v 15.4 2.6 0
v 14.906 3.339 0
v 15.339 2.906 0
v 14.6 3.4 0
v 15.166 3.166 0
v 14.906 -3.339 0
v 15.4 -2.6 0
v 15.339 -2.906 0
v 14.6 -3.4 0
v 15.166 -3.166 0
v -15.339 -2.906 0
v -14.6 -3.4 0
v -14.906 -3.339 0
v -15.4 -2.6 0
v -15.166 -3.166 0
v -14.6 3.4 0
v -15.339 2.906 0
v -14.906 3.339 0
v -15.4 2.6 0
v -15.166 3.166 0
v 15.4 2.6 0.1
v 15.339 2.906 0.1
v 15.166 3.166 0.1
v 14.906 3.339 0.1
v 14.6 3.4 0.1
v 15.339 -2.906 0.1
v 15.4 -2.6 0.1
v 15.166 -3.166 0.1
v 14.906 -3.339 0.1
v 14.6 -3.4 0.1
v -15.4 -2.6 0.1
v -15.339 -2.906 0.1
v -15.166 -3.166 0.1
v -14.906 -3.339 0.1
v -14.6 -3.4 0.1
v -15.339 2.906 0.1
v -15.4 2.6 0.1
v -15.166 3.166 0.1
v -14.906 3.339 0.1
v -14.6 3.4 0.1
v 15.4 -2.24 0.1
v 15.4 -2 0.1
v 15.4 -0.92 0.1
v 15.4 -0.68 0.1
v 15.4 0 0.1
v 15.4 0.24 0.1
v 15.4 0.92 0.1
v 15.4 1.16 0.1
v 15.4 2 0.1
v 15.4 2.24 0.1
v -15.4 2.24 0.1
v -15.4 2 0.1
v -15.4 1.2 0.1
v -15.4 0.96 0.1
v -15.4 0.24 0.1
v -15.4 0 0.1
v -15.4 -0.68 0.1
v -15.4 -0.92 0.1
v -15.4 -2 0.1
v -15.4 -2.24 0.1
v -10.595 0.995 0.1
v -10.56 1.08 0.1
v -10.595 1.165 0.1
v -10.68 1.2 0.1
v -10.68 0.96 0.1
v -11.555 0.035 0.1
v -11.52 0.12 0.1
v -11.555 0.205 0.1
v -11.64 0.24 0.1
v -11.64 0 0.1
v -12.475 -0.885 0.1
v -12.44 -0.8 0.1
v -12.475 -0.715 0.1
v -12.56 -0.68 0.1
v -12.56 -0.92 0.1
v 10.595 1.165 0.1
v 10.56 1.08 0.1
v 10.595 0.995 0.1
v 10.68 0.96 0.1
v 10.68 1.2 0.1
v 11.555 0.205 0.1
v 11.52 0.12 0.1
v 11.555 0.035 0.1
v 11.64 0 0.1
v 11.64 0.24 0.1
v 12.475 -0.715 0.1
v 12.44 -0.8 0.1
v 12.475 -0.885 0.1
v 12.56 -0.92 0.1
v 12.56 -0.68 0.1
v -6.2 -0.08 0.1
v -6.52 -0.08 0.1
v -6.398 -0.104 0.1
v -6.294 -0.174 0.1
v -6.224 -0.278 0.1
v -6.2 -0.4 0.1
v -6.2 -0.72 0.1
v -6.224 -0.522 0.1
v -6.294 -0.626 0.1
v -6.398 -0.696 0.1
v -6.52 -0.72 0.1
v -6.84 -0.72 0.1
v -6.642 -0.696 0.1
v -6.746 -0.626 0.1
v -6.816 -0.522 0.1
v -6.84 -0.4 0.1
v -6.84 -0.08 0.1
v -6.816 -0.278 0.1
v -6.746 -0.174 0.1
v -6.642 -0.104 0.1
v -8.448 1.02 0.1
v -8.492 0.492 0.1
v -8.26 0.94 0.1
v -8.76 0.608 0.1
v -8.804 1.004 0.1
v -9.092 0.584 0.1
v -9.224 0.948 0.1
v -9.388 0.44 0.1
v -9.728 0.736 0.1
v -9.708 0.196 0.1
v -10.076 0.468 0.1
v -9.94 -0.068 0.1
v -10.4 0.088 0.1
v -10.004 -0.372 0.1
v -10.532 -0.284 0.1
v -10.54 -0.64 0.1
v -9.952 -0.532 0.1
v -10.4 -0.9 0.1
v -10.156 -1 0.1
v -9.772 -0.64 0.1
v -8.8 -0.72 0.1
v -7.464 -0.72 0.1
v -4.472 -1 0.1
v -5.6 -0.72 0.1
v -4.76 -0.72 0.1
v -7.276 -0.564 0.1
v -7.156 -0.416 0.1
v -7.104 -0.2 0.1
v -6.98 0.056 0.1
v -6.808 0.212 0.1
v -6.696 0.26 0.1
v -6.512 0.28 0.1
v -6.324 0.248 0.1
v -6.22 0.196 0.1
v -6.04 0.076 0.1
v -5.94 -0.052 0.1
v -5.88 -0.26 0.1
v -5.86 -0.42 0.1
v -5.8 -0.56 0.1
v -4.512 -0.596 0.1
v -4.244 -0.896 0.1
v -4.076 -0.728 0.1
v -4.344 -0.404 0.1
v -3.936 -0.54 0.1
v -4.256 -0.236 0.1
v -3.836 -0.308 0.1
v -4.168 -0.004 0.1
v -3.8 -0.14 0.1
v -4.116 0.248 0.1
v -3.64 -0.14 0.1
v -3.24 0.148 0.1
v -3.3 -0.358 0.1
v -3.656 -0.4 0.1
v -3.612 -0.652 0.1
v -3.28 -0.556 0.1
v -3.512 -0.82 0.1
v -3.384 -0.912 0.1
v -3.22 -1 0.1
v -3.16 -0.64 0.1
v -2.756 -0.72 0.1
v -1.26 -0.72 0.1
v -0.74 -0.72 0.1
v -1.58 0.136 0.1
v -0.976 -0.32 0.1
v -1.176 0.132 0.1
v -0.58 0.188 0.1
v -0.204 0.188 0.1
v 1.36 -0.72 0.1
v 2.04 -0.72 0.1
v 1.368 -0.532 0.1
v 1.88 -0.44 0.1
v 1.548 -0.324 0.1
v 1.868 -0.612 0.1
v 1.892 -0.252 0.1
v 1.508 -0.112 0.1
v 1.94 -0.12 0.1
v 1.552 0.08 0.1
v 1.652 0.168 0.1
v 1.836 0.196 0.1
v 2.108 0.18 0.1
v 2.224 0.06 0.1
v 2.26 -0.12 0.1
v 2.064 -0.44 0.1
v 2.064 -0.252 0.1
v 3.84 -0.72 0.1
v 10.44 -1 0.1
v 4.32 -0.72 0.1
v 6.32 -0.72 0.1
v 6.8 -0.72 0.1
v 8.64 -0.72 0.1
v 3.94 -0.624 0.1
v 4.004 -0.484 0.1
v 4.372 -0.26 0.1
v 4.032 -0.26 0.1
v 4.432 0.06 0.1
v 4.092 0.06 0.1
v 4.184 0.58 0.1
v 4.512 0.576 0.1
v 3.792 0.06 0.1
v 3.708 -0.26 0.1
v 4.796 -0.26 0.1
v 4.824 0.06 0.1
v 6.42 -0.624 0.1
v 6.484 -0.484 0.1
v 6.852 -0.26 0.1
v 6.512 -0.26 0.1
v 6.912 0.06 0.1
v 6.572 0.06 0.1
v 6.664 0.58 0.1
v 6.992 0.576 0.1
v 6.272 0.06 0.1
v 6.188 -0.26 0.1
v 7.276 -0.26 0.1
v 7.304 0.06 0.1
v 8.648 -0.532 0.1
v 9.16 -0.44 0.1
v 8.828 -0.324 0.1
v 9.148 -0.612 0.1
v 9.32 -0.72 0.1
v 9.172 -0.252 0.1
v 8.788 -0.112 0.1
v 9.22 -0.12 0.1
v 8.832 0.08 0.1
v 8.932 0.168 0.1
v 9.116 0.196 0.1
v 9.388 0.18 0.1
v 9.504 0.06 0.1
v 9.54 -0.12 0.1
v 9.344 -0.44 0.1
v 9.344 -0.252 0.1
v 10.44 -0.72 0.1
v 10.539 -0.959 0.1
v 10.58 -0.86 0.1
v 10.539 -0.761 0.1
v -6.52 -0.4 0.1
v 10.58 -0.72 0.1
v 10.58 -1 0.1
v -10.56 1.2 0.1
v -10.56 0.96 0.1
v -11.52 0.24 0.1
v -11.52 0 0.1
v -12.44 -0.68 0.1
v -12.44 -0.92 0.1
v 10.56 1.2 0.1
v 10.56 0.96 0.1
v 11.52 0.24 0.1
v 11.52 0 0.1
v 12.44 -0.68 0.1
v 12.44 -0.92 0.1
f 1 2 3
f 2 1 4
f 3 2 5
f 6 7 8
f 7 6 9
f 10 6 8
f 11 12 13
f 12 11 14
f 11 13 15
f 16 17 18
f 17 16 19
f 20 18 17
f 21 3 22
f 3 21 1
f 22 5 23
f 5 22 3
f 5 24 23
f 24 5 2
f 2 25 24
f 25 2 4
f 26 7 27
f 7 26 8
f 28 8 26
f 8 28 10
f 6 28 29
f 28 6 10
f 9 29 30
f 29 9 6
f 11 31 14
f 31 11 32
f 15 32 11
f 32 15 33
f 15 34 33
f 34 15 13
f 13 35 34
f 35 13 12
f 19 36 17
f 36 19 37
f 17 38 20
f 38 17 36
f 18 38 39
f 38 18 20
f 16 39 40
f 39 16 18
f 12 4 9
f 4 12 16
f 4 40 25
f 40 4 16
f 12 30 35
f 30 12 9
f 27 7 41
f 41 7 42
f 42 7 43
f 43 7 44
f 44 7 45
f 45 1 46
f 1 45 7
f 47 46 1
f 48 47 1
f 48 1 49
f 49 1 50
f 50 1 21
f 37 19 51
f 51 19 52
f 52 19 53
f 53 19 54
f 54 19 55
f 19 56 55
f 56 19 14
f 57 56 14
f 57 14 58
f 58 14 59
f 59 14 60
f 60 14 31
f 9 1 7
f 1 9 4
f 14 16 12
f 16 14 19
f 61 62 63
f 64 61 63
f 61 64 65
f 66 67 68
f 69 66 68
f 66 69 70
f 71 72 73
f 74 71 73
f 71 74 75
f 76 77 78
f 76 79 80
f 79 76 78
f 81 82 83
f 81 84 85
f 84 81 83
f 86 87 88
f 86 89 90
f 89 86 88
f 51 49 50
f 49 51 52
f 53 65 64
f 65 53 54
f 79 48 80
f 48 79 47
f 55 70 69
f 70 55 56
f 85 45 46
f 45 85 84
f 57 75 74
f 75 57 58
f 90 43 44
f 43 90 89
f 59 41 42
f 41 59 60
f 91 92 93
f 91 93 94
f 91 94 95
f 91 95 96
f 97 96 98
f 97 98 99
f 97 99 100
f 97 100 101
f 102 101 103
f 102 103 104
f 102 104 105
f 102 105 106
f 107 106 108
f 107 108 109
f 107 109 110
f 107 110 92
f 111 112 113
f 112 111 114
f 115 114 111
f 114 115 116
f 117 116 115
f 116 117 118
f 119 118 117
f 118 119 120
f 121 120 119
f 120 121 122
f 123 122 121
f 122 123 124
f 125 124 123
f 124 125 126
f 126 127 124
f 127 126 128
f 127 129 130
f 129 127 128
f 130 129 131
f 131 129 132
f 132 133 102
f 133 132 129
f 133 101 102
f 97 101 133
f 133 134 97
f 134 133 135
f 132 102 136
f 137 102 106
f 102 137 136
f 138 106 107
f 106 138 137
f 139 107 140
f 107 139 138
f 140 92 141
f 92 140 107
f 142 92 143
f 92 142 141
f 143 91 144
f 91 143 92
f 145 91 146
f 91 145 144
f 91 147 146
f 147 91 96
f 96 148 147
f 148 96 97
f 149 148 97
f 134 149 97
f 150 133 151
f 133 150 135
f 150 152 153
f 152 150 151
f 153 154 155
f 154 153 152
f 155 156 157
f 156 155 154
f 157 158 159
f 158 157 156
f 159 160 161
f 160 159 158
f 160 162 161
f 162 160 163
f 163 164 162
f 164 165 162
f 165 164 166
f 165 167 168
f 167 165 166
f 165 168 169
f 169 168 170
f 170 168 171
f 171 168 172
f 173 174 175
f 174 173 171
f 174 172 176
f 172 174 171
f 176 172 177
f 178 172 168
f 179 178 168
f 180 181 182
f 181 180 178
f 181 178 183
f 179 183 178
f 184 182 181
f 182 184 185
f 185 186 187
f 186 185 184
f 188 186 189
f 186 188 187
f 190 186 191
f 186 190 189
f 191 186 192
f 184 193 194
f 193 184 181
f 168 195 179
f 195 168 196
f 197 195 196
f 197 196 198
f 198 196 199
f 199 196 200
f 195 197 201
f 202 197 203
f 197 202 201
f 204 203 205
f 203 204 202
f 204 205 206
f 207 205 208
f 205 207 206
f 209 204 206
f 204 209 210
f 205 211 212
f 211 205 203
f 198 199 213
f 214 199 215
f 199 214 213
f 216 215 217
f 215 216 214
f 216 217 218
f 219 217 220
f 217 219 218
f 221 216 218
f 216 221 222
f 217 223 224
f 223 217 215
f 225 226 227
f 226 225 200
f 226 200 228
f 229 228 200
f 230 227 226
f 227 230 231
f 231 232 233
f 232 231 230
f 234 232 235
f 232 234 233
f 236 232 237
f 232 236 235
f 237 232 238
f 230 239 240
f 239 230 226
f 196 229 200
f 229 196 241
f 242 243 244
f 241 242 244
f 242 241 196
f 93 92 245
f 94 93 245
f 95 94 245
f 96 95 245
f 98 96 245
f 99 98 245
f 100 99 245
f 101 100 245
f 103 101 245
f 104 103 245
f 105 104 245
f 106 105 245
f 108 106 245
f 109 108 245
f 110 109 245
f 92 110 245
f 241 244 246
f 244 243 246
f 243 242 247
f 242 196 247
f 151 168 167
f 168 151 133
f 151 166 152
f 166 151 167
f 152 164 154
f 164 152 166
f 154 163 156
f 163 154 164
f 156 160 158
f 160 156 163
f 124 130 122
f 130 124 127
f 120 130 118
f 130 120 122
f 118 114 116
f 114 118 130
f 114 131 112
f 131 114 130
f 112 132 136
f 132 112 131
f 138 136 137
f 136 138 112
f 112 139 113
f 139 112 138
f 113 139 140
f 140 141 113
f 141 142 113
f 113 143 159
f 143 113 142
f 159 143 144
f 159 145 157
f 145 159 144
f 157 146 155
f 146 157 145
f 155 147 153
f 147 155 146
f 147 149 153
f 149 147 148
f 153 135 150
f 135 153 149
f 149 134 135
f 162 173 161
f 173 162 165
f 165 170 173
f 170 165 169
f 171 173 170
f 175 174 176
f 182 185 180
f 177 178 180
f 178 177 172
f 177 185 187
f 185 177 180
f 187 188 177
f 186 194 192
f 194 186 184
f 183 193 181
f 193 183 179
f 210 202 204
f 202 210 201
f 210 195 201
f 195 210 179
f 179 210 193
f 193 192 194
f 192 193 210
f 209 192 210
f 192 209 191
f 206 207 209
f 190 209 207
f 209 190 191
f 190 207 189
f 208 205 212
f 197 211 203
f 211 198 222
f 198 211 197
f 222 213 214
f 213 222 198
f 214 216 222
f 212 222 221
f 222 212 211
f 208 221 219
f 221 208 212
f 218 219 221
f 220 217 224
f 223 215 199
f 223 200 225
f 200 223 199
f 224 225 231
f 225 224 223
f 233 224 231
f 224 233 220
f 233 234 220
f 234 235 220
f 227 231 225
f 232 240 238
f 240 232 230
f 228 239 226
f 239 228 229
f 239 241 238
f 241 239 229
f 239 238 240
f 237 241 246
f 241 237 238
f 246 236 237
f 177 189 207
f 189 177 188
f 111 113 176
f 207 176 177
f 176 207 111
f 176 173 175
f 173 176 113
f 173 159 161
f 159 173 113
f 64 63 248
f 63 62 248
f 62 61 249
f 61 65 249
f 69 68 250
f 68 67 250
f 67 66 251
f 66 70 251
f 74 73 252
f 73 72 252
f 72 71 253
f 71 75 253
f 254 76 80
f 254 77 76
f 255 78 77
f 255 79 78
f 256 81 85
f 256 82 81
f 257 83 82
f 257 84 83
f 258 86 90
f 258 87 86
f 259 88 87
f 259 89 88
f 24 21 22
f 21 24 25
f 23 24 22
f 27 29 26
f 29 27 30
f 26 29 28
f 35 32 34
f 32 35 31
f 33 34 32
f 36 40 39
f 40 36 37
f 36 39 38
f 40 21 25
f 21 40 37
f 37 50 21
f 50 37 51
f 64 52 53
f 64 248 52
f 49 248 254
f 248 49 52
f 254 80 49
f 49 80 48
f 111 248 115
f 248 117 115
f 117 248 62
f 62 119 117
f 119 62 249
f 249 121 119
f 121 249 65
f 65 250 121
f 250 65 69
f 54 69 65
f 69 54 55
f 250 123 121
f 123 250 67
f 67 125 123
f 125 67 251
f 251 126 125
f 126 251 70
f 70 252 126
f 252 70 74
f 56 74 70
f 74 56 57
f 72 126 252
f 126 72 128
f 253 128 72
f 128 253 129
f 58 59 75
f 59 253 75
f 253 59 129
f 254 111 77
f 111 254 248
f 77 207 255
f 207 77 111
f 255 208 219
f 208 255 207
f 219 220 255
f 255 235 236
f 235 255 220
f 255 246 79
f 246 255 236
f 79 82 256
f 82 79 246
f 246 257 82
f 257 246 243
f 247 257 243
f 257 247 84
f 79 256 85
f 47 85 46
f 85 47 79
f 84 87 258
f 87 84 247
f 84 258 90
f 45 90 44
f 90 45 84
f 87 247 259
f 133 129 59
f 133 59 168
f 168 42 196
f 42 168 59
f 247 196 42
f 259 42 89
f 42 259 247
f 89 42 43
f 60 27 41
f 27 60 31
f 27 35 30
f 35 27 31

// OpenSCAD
// file: ../p/4-4disc.scad
use <../lib.scad>
function ldraw_lib__4_4disc() = [
// 0 Disc 1.0
// 0 Name: 4-4disc.dat
// 0 Author: James Jessiman
// 0 !LDRAW_ORG Primitive UPDATE 2002-02
// 0 !LICENSE Licensed under CC BY 4.0 : see CAreadme.txt
// 
// 0 BFC CERTIFY CCW
  [0,"BFC","CERTIFY"],
  [0,"BFC","CCW"],
// 
// 0 !HISTORY 1998-12-15 [PTadmin] Official Update 1998-10
// 0 !HISTORY 2002-03-23 [sbliss] Added BFC statement
// 0 !HISTORY 2002-04-25 [PTadmin] Official Update 2002-02
// 0 !HISTORY 2007-06-24 [PTadmin] Header formatted for Contributor Agreement
// 0 !HISTORY 2008-07-01 [PTadmin] Official Update 2008-01
// 
// 
// 3 16 0 0 0 1 0 0 0.9239 0 0.3827
  [3,16,0,0,0,1,0,0,0.9239,0,0.3827],
// 3 16 0 0 0 0.9239 0 0.3827 0.7071 0 0.7071
  [3,16,0,0,0,0.9239,0,0.3827,0.7071,0,0.7071],
// 3 16 0 0 0 0.7071 0 0.7071 0.3827 0 0.9239
  [3,16,0,0,0,0.7071,0,0.7071,0.3827,0,0.9239],
// 3 16 0 0 0 0.3827 0 0.9239 0 0 1
  [3,16,0,0,0,0.3827,0,0.9239,0,0,1],
// 3 16 0 0 0 0 0 1 -0.3827 0 0.9239
  [3,16,0,0,0,0,0,1,-0.3827,0,0.9239],
// 3 16 0 0 0 -0.3827 0 0.9239 -0.7071 0 0.7071
  [3,16,0,0,0,-0.3827,0,0.9239,-0.7071,0,0.7071],
// 3 16 0 0 0 -0.7071 0 0.7071 -0.9239 0 0.3827
  [3,16,0,0,0,-0.7071,0,0.7071,-0.9239,0,0.3827],
// 3 16 0 0 0 -0.9239 0 0.3827 -1 0 -0
  [3,16,0,0,0,-0.9239,0,0.3827,-1,0,-0],
// 3 16 0 0 0 -1 0 -0 -0.9239 0 -0.3827
  [3,16,0,0,0,-1,0,-0,-0.9239,0,-0.3827],
// 3 16 0 0 0 -0.9239 0 -0.3827 -0.7071 0 -0.7071
  [3,16,0,0,0,-0.9239,0,-0.3827,-0.7071,0,-0.7071],
// 3 16 0 0 0 -0.7071 0 -0.7071 -0.3827 0 -0.9239
  [3,16,0,0,0,-0.7071,0,-0.7071,-0.3827,0,-0.9239],
// 3 16 0 0 0 -0.3827 0 -0.9239 0 0 -1
  [3,16,0,0,0,-0.3827,0,-0.9239,0,0,-1],
// 3 16 0 0 0 0 0 -1 0.3827 0 -0.9239
  [3,16,0,0,0,0,0,-1,0.3827,0,-0.9239],
// 3 16 0 0 0 0.3827 0 -0.9239 0.7071 0 -0.7071
  [3,16,0,0,0,0.3827,0,-0.9239,0.7071,0,-0.7071],
// 3 16 0 0 0 0.7071 0 -0.7071 0.9239 0 -0.3827
  [3,16,0,0,0,0.7071,0,-0.7071,0.9239,0,-0.3827],
// 3 16 0 0 0 0.9239 0 -0.3827 1 0 0
  [3,16,0,0,0,0.9239,0,-0.3827,1,0,0],
// 0
];
module ldraw_lib__4_4disc(step=0, col=false, unit=2/5, alt=false, line=0.2, solid=!$preview)
    makepoly(ldraw_lib__4_4disc(), step=step, col=col, unit=unit, alt=alt, line=line, solid=solid);
ldraw_lib__4_4disc(line=0.2);
// file: ../p/4-4ndis.scad
use <../lib.scad>
function ldraw_lib__4_4ndis() = [
// 0 Disc Negative 1.0
// 0 Name: 4-4ndis.dat
// 0 Author: James Jessiman
// 0 !LDRAW_ORG Primitive UPDATE 2012-01
// 0 !LICENSE Licensed under CC BY 4.0 : see CAreadme.txt
// 
// 0 BFC CERTIFY CCW
  [0,"BFC","CERTIFY"],
  [0,"BFC","CCW"],
// 
// 0 !HISTORY 2002-03-23 [sbliss] Added BFC statement; compacted code
// 0 !HISTORY 2002-04-25 [PTadmin] Official Update 2002-02
// 0 !HISTORY 2007-06-24 [PTadmin] Header formatted for Contributor Agreement
// 0 !HISTORY 2008-07-01 [PTadmin] Official Update 2008-01
// 0 !HISTORY 2012-02-16 [Philo] Changed to CCW
// 0 !HISTORY 2012-03-30 [PTadmin] Official Update 2012-01
// 
// 
// 3 16 0.9239 0 0.3827 1 0 0 1 0 1
  [3,16,0.9239,0,0.3827,1,0,0,1,0,1],
// 3 16 0.7071 0 0.7071 0.9239 0 0.3827 1 0 1
  [3,16,0.7071,0,0.7071,0.9239,0,0.3827,1,0,1],
// 3 16 0.3827 0 0.9239 0.7071 0 0.7071 1 0 1
  [3,16,0.3827,0,0.9239,0.7071,0,0.7071,1,0,1],
// 3 16 0 0 1 0.3827 0 0.9239 1 0 1
  [3,16,0,0,1,0.3827,0,0.9239,1,0,1],
// 3 16 -0.3827 0 0.9239 0 0 1 -1 0 1
  [3,16,-0.3827,0,0.9239,0,0,1,-1,0,1],
// 3 16 -0.7071 0 0.7071 -0.3827 0 0.9239 -1 0 1
  [3,16,-0.7071,0,0.7071,-0.3827,0,0.9239,-1,0,1],
// 3 16 -0.9239 0 0.3827 -0.7071 0 0.7071 -1 0 1
  [3,16,-0.9239,0,0.3827,-0.7071,0,0.7071,-1,0,1],
// 3 16 -1 0 0 -0.9239 0 0.3827 -1 0 1
  [3,16,-1,0,0,-0.9239,0,0.3827,-1,0,1],
// 3 16 -0.9239 0 -0.3827 -1 0 0 -1 0 -1
  [3,16,-0.9239,0,-0.3827,-1,0,0,-1,0,-1],
// 3 16 -0.7071 0 -0.7071 -0.9239 0 -0.3827 -1 0 -1
  [3,16,-0.7071,0,-0.7071,-0.9239,0,-0.3827,-1,0,-1],
// 3 16 -0.3827 0 -0.9239 -0.7071 0 -0.7071 -1 0 -1
  [3,16,-0.3827,0,-0.9239,-0.7071,0,-0.7071,-1,0,-1],
// 3 16 0 0 -1 -0.3827 0 -0.9239 -1 0 -1
  [3,16,0,0,-1,-0.3827,0,-0.9239,-1,0,-1],
// 3 16 0.3827 0 -0.9239 0 0 -1 1 0 -1
  [3,16,0.3827,0,-0.9239,0,0,-1,1,0,-1],
// 3 16 0.7071 0 -0.7071 0.3827 0 -0.9239 1 0 -1
  [3,16,0.7071,0,-0.7071,0.3827,0,-0.9239,1,0,-1],
// 3 16 0.9239 0 -0.3827 0.7071 0 -0.7071 1 0 -1
  [3,16,0.9239,0,-0.3827,0.7071,0,-0.7071,1,0,-1],
// 3 16 1 0 0 0.9239 0 -0.3827 1 0 -1
  [3,16,1,0,0,0.9239,0,-0.3827,1,0,-1],
];
module ldraw_lib__4_4ndis(step=0, col=false, unit=2/5, alt=false, line=0.2, solid=!$preview)
    makepoly(ldraw_lib__4_4ndis(), step=step, col=col, unit=unit, alt=alt, line=line, solid=solid);
ldraw_lib__4_4ndis(line=0.2);
// file: ../p/box3u12.scad
use <../lib.scad>
function ldraw_lib__box3u12() = [
// 0 Box with 3 Parallel Faces without Any Edges
// 0 Name: box3u12.dat
// 0 Author: J.C. Tchang [tchang]
// 0 !LDRAW_ORG Primitive UPDATE 2014-02
// 0 !LICENSE Licensed under CC BY 4.0 : see CAreadme.txt
// 
// 0 BFC CERTIFY CCW
  [0,"BFC","CERTIFY"],
  [0,"BFC","CCW"],
// 
// 0 !HISTORY 2014-12-23 [PTadmin] Official Update 2014-02
// 
// 
// 4 16 -1 1 1 1 1 1 1 1 -1 -1 1 -1
  [4,16,-1,1,1,1,1,1,1,1,-1,-1,1,-1],
// 4 16 -1 1 1 -1 0 1 1 0 1 1 1 1
  [4,16,-1,1,1,-1,0,1,1,0,1,1,1,1],
// 4 16 1 1 -1 1 0 -1 -1 0 -1 -1 1 -1
  [4,16,1,1,-1,1,0,-1,-1,0,-1,-1,1,-1],
];
module ldraw_lib__box3u12(step=0, col=false, unit=2/5, alt=false, line=0.2, solid=!$preview)
    makepoly(ldraw_lib__box3u12(), step=step, col=col, unit=unit, alt=alt, line=line, solid=solid);
ldraw_lib__box3u12(line=0.2);
// file: ../p/8/2-4ndis.scad
use <../../lib.scad>
function ldraw_lib__8__2_4ndis() = [
// 0 Lo-Res Disc Negative 0.5
// 0 Name: 8\2-4ndis.dat
// 0 Author: Magnus Forsberg [MagFors]
// 0 !LDRAW_ORG 8_Primitive UPDATE 2018-02
// 0 !LICENSE Licensed under CC BY 4.0 : see CAreadme.txt
// 
// 0 BFC CERTIFY CCW
  [0,"BFC","CERTIFY"],
  [0,"BFC","CCW"],
// 
// 0 !HISTORY 2018-12-08 [PTadmin] Official Update 2018-02
// 
// 
// 3 16 1 0 1 0.7071 0 0.7071 1 0 0
  [3,16,1,0,1,0.7071,0,0.7071,1,0,0],
// 3 16 1 0 1 0 0 1 0.7071 0 0.7071
  [3,16,1,0,1,0,0,1,0.7071,0,0.7071],
// 3 16 -1 0 1 -0.7071 0 0.7071 0 0 1
  [3,16,-1,0,1,-0.7071,0,0.7071,0,0,1],
// 3 16 -1 0 1 -1 0 0 -0.7071 0 0.7071
  [3,16,-1,0,1,-1,0,0,-0.7071,0,0.7071],
// 0 // Build by Primitive Generator 2
];
module ldraw_lib__8__2_4ndis(step=0, col=false, unit=2/5, alt=false, line=0.2, solid=!$preview)
    makepoly(ldraw_lib__8__2_4ndis(), step=step, col=col, unit=unit, alt=alt, line=line, solid=solid);
ldraw_lib__8__2_4ndis(line=0.2);
// file: ../p/8/2-4chrd.scad
use <../../lib.scad>
function ldraw_lib__8__2_4chrd() = [
// 0 Chord 0.5
// 0 Name: 8\2-4chrd.dat
// 0 Author: Magnus Forsberg [MagFors]
// 0 !LDRAW_ORG 8_Primitive UPDATE 2017-01
// 0 !LICENSE Licensed under CC BY 4.0 : see CAreadme.txt
// 
// 0 BFC CERTIFY CCW
  [0,"BFC","CERTIFY"],
  [0,"BFC","CCW"],
// 
// 0 !HISTORY 2017-12-30 [PTadmin] Official Update 2017-01
// 
// 
// 3 16 .7071 0 .7071 0 0 1 -.7071 0 .7071
  [3,16,.7071,0,.7071,0,0,1,-.7071,0,.7071],
// 4 16 .7071 0 .7071 -.7071 0 .7071 -1 0 0 1 0 0
  [4,16,.7071,0,.7071,-.7071,0,.7071,-1,0,0,1,0,0],
];
module ldraw_lib__8__2_4chrd(step=0, col=false, unit=2/5, alt=false, line=0.2, solid=!$preview)
    makepoly(ldraw_lib__8__2_4chrd(), step=step, col=col, unit=unit, alt=alt, line=line, solid=solid);
ldraw_lib__8__2_4chrd(line=0.2);
// file: ../p/1-4cyli.scad
use <../lib.scad>
function ldraw_lib__1_4cyli() = [
// 0 Cylinder 0.25
// 0 Name: 1-4cyli.dat
// 0 Author: James Jessiman
// 0 !LDRAW_ORG Primitive UPDATE 2012-01
// 0 !LICENSE Licensed under CC BY 4.0 : see CAreadme.txt
// 
// 0 BFC CERTIFY CCW
  [0,"BFC","CERTIFY"],
  [0,"BFC","CCW"],
// 
// 0 !HISTORY 2002-03-23 [sbliss] Added BFC statement.
// 0 !HISTORY 2002-04-25 [PTadmin] Official Update 2002-02
// 0 !HISTORY 2007-06-22 [PTadmin] Header formatted for Contributor Agreement
// 0 !HISTORY 2008-07-01 [PTadmin] Official Update 2008-01
// 0 !HISTORY 2012-02-16 [Philo] Changed to CCW
// 0 !HISTORY 2012-03-30 [PTadmin] Official Update 2012-01
// 
// 
// 4 16 1 1 0 0.9239 1 0.3827 0.9239 0 0.3827 1 0 0
  [4,16,1,1,0,0.9239,1,0.3827,0.9239,0,0.3827,1,0,0],
// 5 24 1 0 0 1 1 0 0.9239 0 0.3827 1 0 -1
  [5,24,1,0,0,1,1,0,0.9239,0,0.3827,1,0,-1],
// 4 16 0.9239 1 0.3827 0.7071 1 0.7071 0.7071 0 0.7071 0.9239 0 0.3827
  [4,16,0.9239,1,0.3827,0.7071,1,0.7071,0.7071,0,0.7071,0.9239,0,0.3827],
// 5 24 0.9239 0 0.3827 0.9239 1 0.3827 0.7071 0 0.7071 1 0 0
  [5,24,0.9239,0,0.3827,0.9239,1,0.3827,0.7071,0,0.7071,1,0,0],
// 4 16 0.7071 1 0.7071 0.3827 1 0.9239 0.3827 0 0.9239 0.7071 0 0.7071
  [4,16,0.7071,1,0.7071,0.3827,1,0.9239,0.3827,0,0.9239,0.7071,0,0.7071],
// 5 24 0.7071 0 0.7071 0.7071 1 0.7071 0.3827 0 0.9239 0.9239 0 0.3827
  [5,24,0.7071,0,0.7071,0.7071,1,0.7071,0.3827,0,0.9239,0.9239,0,0.3827],
// 4 16 0.3827 1 0.9239 0 1 1 0 0 1 0.3827 0 0.9239
  [4,16,0.3827,1,0.9239,0,1,1,0,0,1,0.3827,0,0.9239],
// 5 24 0.3827 0 0.9239 0.3827 1 0.9239 0 0 1 0.7071 0 0.7071
  [5,24,0.3827,0,0.9239,0.3827,1,0.9239,0,0,1,0.7071,0,0.7071],
// 5 24 0 0 1 0 1 1 0.3827 0 0.9239 -1 0 1
  [5,24,0,0,1,0,1,1,0.3827,0,0.9239,-1,0,1],
];
module ldraw_lib__1_4cyli(step=0, col=false, unit=2/5, alt=false, line=0.2, solid=!$preview)
    makepoly(ldraw_lib__1_4cyli(), step=step, col=col, unit=unit, alt=alt, line=line, solid=solid);
ldraw_lib__1_4cyli(line=0.2);
// file: ../p/1-4chrd.scad
use <../lib.scad>
function ldraw_lib__1_4chrd() = [
// 0 Chord 0.25
// 0 Name: 1-4chrd.dat
// 0 Author: Max Martin Richter [MMR1988]
// 0 !LDRAW_ORG Primitive UPDATE 2023-05
// 0 !LICENSE Licensed under CC BY 4.0 : see CAreadme.txt
// 
// 0 BFC CERTIFY CCW
  [0,"BFC","CERTIFY"],
  [0,"BFC","CCW"],
// 
// 0 !HISTORY 2004-04-22 [PTadmin] Official Update 2004-02
// 0 !HISTORY 2007-10-09 [PTadmin] Header formatted for Contributor Agreement
// 0 !HISTORY 2008-07-01 [PTadmin] Official Update 2008-01
// 0 !HISTORY 2012-08-02 [MMR1988] Re-creation with PrimGen2 and Rectifier
// 0 !HISTORY 2012-08-09 [PTadmin] Official Update 2012-02
// 0 !HISTORY 2023-10-27 [OrionP] Change author to MMR1988 from hafhead
// 0 !HISTORY 2023-10-31 [OrionP] Official Update 2023-05
// 
// 4 16 0.9239 0 0.3827 0.3827 0 0.9239 0 0 1 1 0 0
  [4,16,0.9239,0,0.3827,0.3827,0,0.9239,0,0,1,1,0,0],
// 3 16 0.7071 0 0.7071 0.3827 0 0.9239 0.9239 0 0.3827
  [3,16,0.7071,0,0.7071,0.3827,0,0.9239,0.9239,0,0.3827],
];
module ldraw_lib__1_4chrd(step=0, col=false, unit=2/5, alt=false, line=0.2, solid=!$preview)
    makepoly(ldraw_lib__1_4chrd(), step=step, col=col, unit=unit, alt=alt, line=line, solid=solid);
ldraw_lib__1_4chrd(line=0.2);
// main file
use <../lib.scad>
use <../p/1-4chrd.scad>
use <../p/1-4cyli.scad>
use <../p/8/2-4chrd.scad>
use <../p/8/2-4ndis.scad>
use <../p/box3u12.scad>
use <s/6451314es01.scad>
use <s/6451314es02.scad>
function ldraw_lib__6451314e() = [
// 0 Sticker  0.8 x  3.9 with Dark Bluish Grey "Corvette" on Light Bluish Grey Background
// 0 Name: 6451314e.dat
// 0 Author: Vincent Messenet [Cheenzo]
// 0 !LDRAW_ORG Part UPDATE 2024-07
// 0 !LICENSE Licensed under CC BY 4.0 : see CAreadme.txt
// 
// 0 BFC CERTIFY CCW
  [0,"BFC","CERTIFY"],
  [0,"BFC","CCW"],
// 
// 0 !KEYWORDS Bricklink 10321stk01, Brickowl 1314396, Chevrolet, Corvette, Icons
// 0 !KEYWORDS Rebrickable 10104784, Set 10321
// 
// 0 !HISTORY 2024-08-26 [OrionP] Official Update 2024-07
// 
// 1 16 36.5 0 6.5 2 0 0 0 -1 0 0 0 2 1-4chrd.dat
  [1,16,36.5,0,6.5,2,0,0,0,-1,0,0,0,2, ldraw_lib__1_4chrd()],
// 1 16 36.5 0 -6.5 2 0 0 0 -1 0 0 0 -2 1-4chrd.dat
  [1,16,36.5,0,-6.5,2,0,0,0,-1,0,0,0,-2, ldraw_lib__1_4chrd()],
// 1 16 -36.5 0 -6.5 -2 0 0 0 -1 0 0 0 -2 1-4chrd.dat
  [1,16,-36.5,0,-6.5,-2,0,0,0,-1,0,0,0,-2, ldraw_lib__1_4chrd()],
// 1 16 -36.5 0 6.5 -2 0 0 0 -1 0 0 0 2 1-4chrd.dat
  [1,16,-36.5,0,6.5,-2,0,0,0,-1,0,0,0,2, ldraw_lib__1_4chrd()],
// 1 16 36.5 0 6.5 2 0 0 0 -.25 0 0 0 2 1-4cyli.dat
  [1,16,36.5,0,6.5,2,0,0,0,-.25,0,0,0,2, ldraw_lib__1_4cyli()],
// 1 16 36.5 0 -6.5 2 0 0 0 -.25 0 0 0 -2 1-4cyli.dat
  [1,16,36.5,0,-6.5,2,0,0,0,-.25,0,0,0,-2, ldraw_lib__1_4cyli()],
// 1 16 -36.5 0 -6.5 -2 0 0 0 -.25 0 0 0 -2 1-4cyli.dat
  [1,16,-36.5,0,-6.5,-2,0,0,0,-.25,0,0,0,-2, ldraw_lib__1_4cyli()],
// 1 16 -36.5 0 6.5 -2 0 0 0 -.25 0 0 0 2 1-4cyli.dat
  [1,16,-36.5,0,6.5,-2,0,0,0,-.25,0,0,0,2, ldraw_lib__1_4cyli()],
// 1 16 0 -.25 0 36.5 0 0 0 .25 0 0 0 8.5 box3u12.dat
  [1,16,0,-.25,0,36.5,0,0,0,.25,0,0,0,8.5, ldraw_lib__box3u12()],
// 3 16 38.5 -.25 -6.5 38.5 0 -6.5 38.5 -.25 -5.6
  [3,16,38.5,-.25,-6.5,38.5,0,-6.5,38.5,-.25,-5.6],
// 3 16 38.5 -.25 -5.6 38.5 0 -6.5 38.5 -.25 -5
  [3,16,38.5,-.25,-5.6,38.5,0,-6.5,38.5,-.25,-5],
// 3 16 38.5 -.25 -5 38.5 0 -6.5 38.5 -.25 -2.3
  [3,16,38.5,-.25,-5,38.5,0,-6.5,38.5,-.25,-2.3],
// 3 16 38.5 -.25 -2.3 38.5 0 -6.5 38.5 -.25 -1.7
  [3,16,38.5,-.25,-2.3,38.5,0,-6.5,38.5,-.25,-1.7],
// 3 16 38.5 -.25 -1.7 38.5 0 -6.5 38.5 -.25 0
  [3,16,38.5,-.25,-1.7,38.5,0,-6.5,38.5,-.25,0],
// 4 16 38.5 -.25 .6 38.5 -.25 0 38.5 0 -6.5 38.5 0 6.5
  [4,16,38.5,-.25,.6,38.5,-.25,0,38.5,0,-6.5,38.5,0,6.5],
// 3 16 38.5 -.25 2.3 38.5 -.25 .6 38.5 0 6.5
  [3,16,38.5,-.25,2.3,38.5,-.25,.6,38.5,0,6.5],
// 3 16 38.5 -.25 2.9 38.5 -.25 2.3 38.5 0 6.5
  [3,16,38.5,-.25,2.9,38.5,-.25,2.3,38.5,0,6.5],
// 3 16 38.5 -.25 2.9 38.5 0 6.5 38.5 -.25 5
  [3,16,38.5,-.25,2.9,38.5,0,6.5,38.5,-.25,5],
// 3 16 38.5 -.25 5 38.5 0 6.5 38.5 -.25 5.6
  [3,16,38.5,-.25,5,38.5,0,6.5,38.5,-.25,5.6],
// 3 16 38.5 -.25 5.6 38.5 0 6.5 38.5 -.25 6.5
  [3,16,38.5,-.25,5.6,38.5,0,6.5,38.5,-.25,6.5],
// 3 16 -38.5 -.25 6.5 -38.5 0 6.5 -38.5 -.25 5.6
  [3,16,-38.5,-.25,6.5,-38.5,0,6.5,-38.5,-.25,5.6],
// 3 16 -38.5 -.25 5.6 -38.5 0 6.5 -38.5 -.25 5
  [3,16,-38.5,-.25,5.6,-38.5,0,6.5,-38.5,-.25,5],
// 3 16 -38.5 -.25 5 -38.5 0 6.5 -38.5 -.25 3
  [3,16,-38.5,-.25,5,-38.5,0,6.5,-38.5,-.25,3],
// 3 16 -38.5 -.25 3 -38.5 0 6.5 -38.5 -.25 2.4
  [3,16,-38.5,-.25,3,-38.5,0,6.5,-38.5,-.25,2.4],
// 3 16 -38.5 -.25 2.4 -38.5 0 6.5 -38.5 -.25 .6
  [3,16,-38.5,-.25,2.4,-38.5,0,6.5,-38.5,-.25,.6],
// 4 16 -38.5 -.25 0 -38.5 -.25 .6 -38.5 0 6.5 -38.5 0 -6.5
  [4,16,-38.5,-.25,0,-38.5,-.25,.6,-38.5,0,6.5,-38.5,0,-6.5],
// 3 16 -38.5 -.25 -1.7 -38.5 -.25 0 -38.5 0 -6.5
  [3,16,-38.5,-.25,-1.7,-38.5,-.25,0,-38.5,0,-6.5],
// 3 16 -38.5 -.25 -1.7 -38.5 0 -6.5 -38.5 -.25 -2.3
  [3,16,-38.5,-.25,-1.7,-38.5,0,-6.5,-38.5,-.25,-2.3],
// 3 16 -38.5 -.25 -2.3 -38.5 0 -6.5 -38.5 -.25 -5
  [3,16,-38.5,-.25,-2.3,-38.5,0,-6.5,-38.5,-.25,-5],
// 3 16 -38.5 -.25 -5 -38.5 0 -6.5 -38.5 -.25 -5.6
  [3,16,-38.5,-.25,-5,-38.5,0,-6.5,-38.5,-.25,-5.6],
// 3 16 -38.5 -.25 -5.6 -38.5 0 -6.5 -38.5 -.25 -6.5
  [3,16,-38.5,-.25,-5.6,-38.5,0,-6.5,-38.5,-.25,-6.5],
// 4 16 36.5 0 8.5 38.5 0 6.5 38.5 0 -6.5 36.5 0 -8.5
  [4,16,36.5,0,8.5,38.5,0,6.5,38.5,0,-6.5,36.5,0,-8.5],
// 4 16 -36.5 0 -8.5 -38.5 0 -6.5 -38.5 0 6.5 -36.5 0 8.5
  [4,16,-36.5,0,-8.5,-38.5,0,-6.5,-38.5,0,6.5,-36.5,0,8.5],
// 1 72 -26.7 -.25 2.7 0 0 .3 0 1 0 .3 0 0 8\2-4chrd.dat
  [1,72,-26.7,-.25,2.7,0,0,.3,0,1,0,.3,0,0, ldraw_lib__8__2_4chrd()],
// 1 72 -29.1 -.25 .3 0 0 .3 0 1 0 .3 0 0 8\2-4chrd.dat
  [1,72,-29.1,-.25,.3,0,0,.3,0,1,0,.3,0,0, ldraw_lib__8__2_4chrd()],
// 1 72 -31.4 -.25 -2 0 0 .3 0 1 0 .3 0 0 8\2-4chrd.dat
  [1,72,-31.4,-.25,-2,0,0,.3,0,1,0,.3,0,0, ldraw_lib__8__2_4chrd()],
// 1 72 26.7 -.25 2.7 0 0 -.3 0 1 0 .3 0 0 8\2-4chrd.dat
  [1,72,26.7,-.25,2.7,0,0,-.3,0,1,0,.3,0,0, ldraw_lib__8__2_4chrd()],
// 1 72 29.1 -.25 .3 0 0 -.3 0 1 0 .3 0 0 8\2-4chrd.dat
  [1,72,29.1,-.25,.3,0,0,-.3,0,1,0,.3,0,0, ldraw_lib__8__2_4chrd()],
// 1 72 31.4 -.25 -2 0 0 -.3 0 1 0 .3 0 0 8\2-4chrd.dat
  [1,72,31.4,-.25,-2,0,0,-.3,0,1,0,.3,0,0, ldraw_lib__8__2_4chrd()],
// 4 72 -38.5 -.25 5 38.5 -.25 5 38.5 -.25 5.6 -38.5 -.25 5.6
  [4,72,-38.5,-.25,5,38.5,-.25,5,38.5,-.25,5.6,-38.5,-.25,5.6],
// 4 72 -38.5 -.25 3 -38.5 -.25 2.4 -26.7 -.25 2.4 -26.7 -.25 3
  [4,72,-38.5,-.25,3,-38.5,-.25,2.4,-26.7,-.25,2.4,-26.7,-.25,3],
// 4 72 26.7 -.25 2.4 38.5 -.25 2.3 38.5 -.25 2.9 26.7 -.25 3
  [4,72,26.7,-.25,2.4,38.5,-.25,2.3,38.5,-.25,2.9,26.7,-.25,3],
// 4 72 -38.5 -.25 .6 -38.5 -.25 0 -29.1 -.25 0 -29.1 -.25 .6
  [4,72,-38.5,-.25,.6,-38.5,-.25,0,-29.1,-.25,0,-29.1,-.25,.6],
// 4 72 29.1 -.25 0 38.5 -.25 0 38.5 -.25 .6 29.1 -.25 .6
  [4,72,29.1,-.25,0,38.5,-.25,0,38.5,-.25,.6,29.1,-.25,.6],
// 4 72 -31.4 -.25 -1.7 -38.5 -.25 -1.7 -38.5 -.25 -2.3 -31.4 -.25 -2.3
  [4,72,-31.4,-.25,-1.7,-38.5,-.25,-1.7,-38.5,-.25,-2.3,-31.4,-.25,-2.3],
// 4 72 31.4 -.25 -2.3 38.5 -.25 -2.3 38.5 -.25 -1.7 31.4 -.25 -1.7
  [4,72,31.4,-.25,-2.3,38.5,-.25,-2.3,38.5,-.25,-1.7,31.4,-.25,-1.7],
// 4 72 38.5 -.25 -5.6 38.5 -.25 -5 -38.5 -.25 -5 -38.5 -.25 -5.6
  [4,72,38.5,-.25,-5.6,38.5,-.25,-5,-38.5,-.25,-5,-38.5,-.25,-5.6],
// 1 72 -26.35 -.25 -2.5 1 0 0 0 1 0 0 0 1 s\6451314es01.dat
  [1,72,-26.35,-.25,-2.5,1,0,0,0,1,0,0,0,1, ldraw_lib__s__6451314es01()],
// 1 71 -26.35 -.25 -2.5 1 0 0 0 1 0 0 0 1 s\6451314es02.dat
  [1,71,-26.35,-.25,-2.5,1,0,0,0,1,0,0,0,1, ldraw_lib__s__6451314es02()],
// 1 71 -26.7 -.25 2.7 0 0 .3 0 1 0 .3 0 0 8\2-4ndis.dat
  [1,71,-26.7,-.25,2.7,0,0,.3,0,1,0,.3,0,0, ldraw_lib__8__2_4ndis()],
// 1 71 -29.1 -.25 .3 0 0 .3 0 1 0 .3 0 0 8\2-4ndis.dat
  [1,71,-29.1,-.25,.3,0,0,.3,0,1,0,.3,0,0, ldraw_lib__8__2_4ndis()],
// 1 71 -31.4 -.25 -2 0 0 .3 0 1 0 .3 0 0 8\2-4ndis.dat
  [1,71,-31.4,-.25,-2,0,0,.3,0,1,0,.3,0,0, ldraw_lib__8__2_4ndis()],
// 1 71 26.7 -.25 2.7 0 0 -.3 0 1 0 .3 0 0 8\2-4ndis.dat
  [1,71,26.7,-.25,2.7,0,0,-.3,0,1,0,.3,0,0, ldraw_lib__8__2_4ndis()],
// 1 71 29.1 -.25 .3 0 0 -.3 0 1 0 .3 0 0 8\2-4ndis.dat
  [1,71,29.1,-.25,.3,0,0,-.3,0,1,0,.3,0,0, ldraw_lib__8__2_4ndis()],
// 1 71 31.4 -.25 -2 0 0 -.3 0 1 0 .3 0 0 8\2-4ndis.dat
  [1,71,31.4,-.25,-2,0,0,-.3,0,1,0,.3,0,0, ldraw_lib__8__2_4ndis()],
// 1 71 36.5 -.25 6.5 2 0 0 0 1 0 0 0 2 1-4chrd.dat
  [1,71,36.5,-.25,6.5,2,0,0,0,1,0,0,0,2, ldraw_lib__1_4chrd()],
// 1 71 36.5 -.25 -6.5 2 0 0 0 1 0 0 0 -2 1-4chrd.dat
  [1,71,36.5,-.25,-6.5,2,0,0,0,1,0,0,0,-2, ldraw_lib__1_4chrd()],
// 1 71 -36.5 -.25 -6.5 -2 0 0 0 1 0 0 0 -2 1-4chrd.dat
  [1,71,-36.5,-.25,-6.5,-2,0,0,0,1,0,0,0,-2, ldraw_lib__1_4chrd()],
// 1 71 -36.5 -.25 6.5 -2 0 0 0 1 0 0 0 2 1-4chrd.dat
  [1,71,-36.5,-.25,6.5,-2,0,0,0,1,0,0,0,2, ldraw_lib__1_4chrd()],
// 4 71 36.5 -.25 8.5 -36.5 -.25 8.5 -38.5 -.25 6.5 38.5 -.25 6.5
  [4,71,36.5,-.25,8.5,-36.5,-.25,8.5,-38.5,-.25,6.5,38.5,-.25,6.5],
// 4 71 -38.5 -.25 5.6 38.5 -.25 5.6 38.5 -.25 6.5 -38.5 -.25 6.5
  [4,71,-38.5,-.25,5.6,38.5,-.25,5.6,38.5,-.25,6.5,-38.5,-.25,6.5],
// 3 71 -26.7 -.25 3 -38.5 -.25 5 -38.5 -.25 3
  [3,71,-26.7,-.25,3,-38.5,-.25,5,-38.5,-.25,3],
// 3 71 -26.7 -.25 3 -26.4 -.25 3 -38.5 -.25 5
  [3,71,-26.7,-.25,3,-26.4,-.25,3,-38.5,-.25,5],
// 4 71 -38.5 -.25 5 -26.4 -.25 3 26.4 -.25 3 38.5 -.25 5
  [4,71,-38.5,-.25,5,-26.4,-.25,3,26.4,-.25,3,38.5,-.25,5],
// 3 71 26.4 -.25 3 26.7 -.25 3 38.5 -.25 5
  [3,71,26.4,-.25,3,26.7,-.25,3,38.5,-.25,5],
// 3 71 38.5 -.25 5 26.7 -.25 3 38.5 -.25 2.9
  [3,71,38.5,-.25,5,26.7,-.25,3,38.5,-.25,2.9],
// 3 71 -21.12 -.25 2.55 -26.4 -.25 3 -22.01 -.25 2.51
  [3,71,-21.12,-.25,2.55,-26.4,-.25,3,-22.01,-.25,2.51],
// 4 71 -22.01 -.25 2.51 -26.4 -.25 3 -26.4 -.25 2.7 -23.06 -.25 2.37
  [4,71,-22.01,-.25,2.51,-26.4,-.25,3,-26.4,-.25,2.7,-23.06,-.25,2.37],
// 4 71 -23.06 -.25 2.37 -26.4 -.25 2.7 -26.4 -.25 2.4 -24.32 -.25 1.84
  [4,71,-23.06,-.25,2.37,-26.4,-.25,2.7,-26.4,-.25,2.4,-24.32,-.25,1.84],
// 4 71 -24.32 -.25 1.84 -26.4 -.25 2.4 -26.7 -.25 2.4 -25.19 -.25 1.17
  [4,71,-24.32,-.25,1.84,-26.4,-.25,2.4,-26.7,-.25,2.4,-25.19,-.25,1.17],
// 4 71 -29.1 -.25 .6 -28.8 -.25 .6 -25.19 -.25 1.17 -26.7 -.25 2.4
  [4,71,-29.1,-.25,.6,-28.8,-.25,.6,-25.19,-.25,1.17,-26.7,-.25,2.4],
// 4 71 -38.5 -.25 .6 -29.1 -.25 .6 -26.7 -.25 2.4 -38.5 -.25 2.4
  [4,71,-38.5,-.25,.6,-29.1,-.25,.6,-26.7,-.25,2.4,-38.5,-.25,2.4],
// 4 71 -28.8 -.25 .3 -26 -.25 .22 -25.19 -.25 1.17 -28.8 -.25 .6
  [4,71,-28.8,-.25,.3,-26,-.25,.22,-25.19,-.25,1.17,-28.8,-.25,.6],
// 4 71 -26 -.25 .22 -28.8 -.25 .3 -28.8 -.25 0 -26.33 -.25 -.71
  [4,71,-26,-.25,.22,-28.8,-.25,.3,-28.8,-.25,0,-26.33,-.25,-.71],
// 4 71 -26.35 -.25 -1.6 -26.33 -.25 -.71 -28.8 -.25 0 -29.1 -.25 0
  [4,71,-26.35,-.25,-1.6,-26.33,-.25,-.71,-28.8,-.25,0,-29.1,-.25,0],
// 4 71 -26.35 -.25 -1.6 -29.1 -.25 0 -31.4 -.25 -1.7 -31.1 -.25 -1.7
  [4,71,-26.35,-.25,-1.6,-29.1,-.25,0,-31.4,-.25,-1.7,-31.1,-.25,-1.7],
// 4 71 -38.5 -.25 0 -38.5 -.25 -1.7 -31.4 -.25 -1.7 -29.1 -.25 0
  [4,71,-38.5,-.25,0,-38.5,-.25,-1.7,-31.4,-.25,-1.7,-29.1,-.25,0],
// 4 71 -26.35 -.25 -1.6 -31.1 -.25 -1.7 -31.1 -.25 -2 -26 -.25 -2.25
  [4,71,-26.35,-.25,-1.6,-31.1,-.25,-1.7,-31.1,-.25,-2,-26,-.25,-2.25],
// 4 71 -31.1 -.25 -2.3 -25.39 -.25 -2.5 -26 -.25 -2.25 -31.1 -.25 -2
  [4,71,-31.1,-.25,-2.3,-25.39,-.25,-2.5,-26,-.25,-2.25,-31.1,-.25,-2],
// 3 71 -38.5 -.25 -2.3 -38.5 -.25 -5 -31.4 -.25 -2.3
  [3,71,-38.5,-.25,-2.3,-38.5,-.25,-5,-31.4,-.25,-2.3],
// 4 71 -31.4 -.25 -2.3 -38.5 -.25 -5 -25.39 -.25 -2.5 -31.1 -.25 -2.3
  [4,71,-31.4,-.25,-2.3,-38.5,-.25,-5,-25.39,-.25,-2.5,-31.1,-.25,-2.3],
// 4 71 -26.4 -.25 3 -21.12 -.25 2.55 26.4 -.25 2.7 26.4 -.25 3
  [4,71,-26.4,-.25,3,-21.12,-.25,2.55,26.4,-.25,2.7,26.4,-.25,3],
// 4 71 26.4 -.25 2.7 -21.12 -.25 2.55 10.46 -.25 1.45 26.4 -.25 2.4
  [4,71,26.4,-.25,2.7,-21.12,-.25,2.55,10.46,-.25,1.45,26.4,-.25,2.4],
// 4 71 16.66 -.25 1.45 26.4 -.25 2.4 10.46 -.25 1.45 11.28 -.25 1.44
  [4,71,16.66,-.25,1.45,26.4,-.25,2.4,10.46,-.25,1.45,11.28,-.25,1.44],
// 3 71 16.66 -.25 1.45 17.48 -.25 1.44 26.4 -.25 2.4
  [3,71,16.66,-.25,1.45,17.48,-.25,1.44,26.4,-.25,2.4],
// 4 71 17.48 -.25 1.44 22.79 -.25 .49 23.47 -.25 .45 26.4 -.25 2.4
  [4,71,17.48,-.25,1.44,22.79,-.25,.49,23.47,-.25,.45,26.4,-.25,2.4],
// 4 71 26.4 -.25 2.4 23.47 -.25 .45 26.45 -.25 -1.8 26.7 -.25 2.4
  [4,71,26.4,-.25,2.4,23.47,-.25,.45,26.45,-.25,-1.8,26.7,-.25,2.4],
// 4 71 26.7 -.25 2.4 26.45 -.25 -1.8 28.8 -.25 .3 28.8 -.25 .6
  [4,71,26.7,-.25,2.4,26.45,-.25,-1.8,28.8,-.25,.3,28.8,-.25,.6],
// 4 71 26.45 -.25 -1.8 26.45 -.25 -2.15 28.8 -.25 0 28.8 -.25 .3
  [4,71,26.45,-.25,-1.8,26.45,-.25,-2.15,28.8,-.25,0,28.8,-.25,.3],
// 4 71 29.1 -.25 0 28.8 -.25 0 26.45 -.25 -2.15 26.45 -.25 -2.5
  [4,71,29.1,-.25,0,28.8,-.25,0,26.45,-.25,-2.15,26.45,-.25,-2.5],
// 3 71 26.7 -.25 2.4 28.8 -.25 .6 29.1 -.25 .6
  [3,71,26.7,-.25,2.4,28.8,-.25,.6,29.1,-.25,.6],
// 4 71 29.1 -.25 .6 38.5 -.25 .6 38.5 -.25 2.3 26.7 -.25 2.4
  [4,71,29.1,-.25,.6,38.5,-.25,.6,38.5,-.25,2.3,26.7,-.25,2.4],
// 4 71 31.1 -.25 -2 31.1 -.25 -1.7 29.1 -.25 0 26.45 -.25 -2.5
  [4,71,31.1,-.25,-2,31.1,-.25,-1.7,29.1,-.25,0,26.45,-.25,-2.5],
// 3 71 29.1 -.25 0 31.1 -.25 -1.7 31.4 -.25 -1.7
  [3,71,29.1,-.25,0,31.1,-.25,-1.7,31.4,-.25,-1.7],
// 4 71 29.1 -.25 0 31.4 -.25 -1.7 38.5 -.25 -1.7 38.5 -.25 0
  [4,71,29.1,-.25,0,31.4,-.25,-1.7,38.5,-.25,-1.7,38.5,-.25,0],
// 3 71 31.1 -.25 -2 26.45 -.25 -2.5 31.1 -.25 -2.3
  [3,71,31.1,-.25,-2,26.45,-.25,-2.5,31.1,-.25,-2.3],
// 3 71 -11.18 -.25 -2.5 -25.39 -.25 -2.5 -38.5 -.25 -5
  [3,71,-11.18,-.25,-2.5,-25.39,-.25,-2.5,-38.5,-.25,-5],
// 3 71 -11.18 -.25 -2.5 -38.5 -.25 -5 -8.05 -.25 -2.5
  [3,71,-11.18,-.25,-2.5,-38.5,-.25,-5,-8.05,-.25,-2.5],
// 4 71 -8.05 -.25 -2.5 -38.5 -.25 -5 38.5 -.25 -5 26.1 -.25 -2.5
  [4,71,-8.05,-.25,-2.5,-38.5,-.25,-5,38.5,-.25,-5,26.1,-.25,-2.5],
// 3 71 26.45 -.25 -2.5 26.1 -.25 -2.5 38.5 -.25 -5
  [3,71,26.45,-.25,-2.5,26.1,-.25,-2.5,38.5,-.25,-5],
// 4 71 26.45 -.25 -2.5 38.5 -.25 -5 31.4 -.25 -2.3 31.1 -.25 -2.3
  [4,71,26.45,-.25,-2.5,38.5,-.25,-5,31.4,-.25,-2.3,31.1,-.25,-2.3],
// 3 71 31.4 -.25 -2.3 38.5 -.25 -5 38.5 -.25 -2.3
  [3,71,31.4,-.25,-2.3,38.5,-.25,-5,38.5,-.25,-2.3],
// 4 71 38.5 -.25 -5.6 -38.5 -.25 -5.6 -38.5 -.25 -6.5 38.5 -.25 -6.5
  [4,71,38.5,-.25,-5.6,-38.5,-.25,-5.6,-38.5,-.25,-6.5,38.5,-.25,-6.5],
// 4 71 36.5 -.25 -8.5 38.5 -.25 -6.5 -38.5 -.25 -6.5 -36.5 -.25 -8.5
  [4,71,36.5,-.25,-8.5,38.5,-.25,-6.5,-38.5,-.25,-6.5,-36.5,-.25,-8.5],
];
module ldraw_lib__6451314e(step=0, col=false, unit=2/5, alt=false, line=0.2, solid=!$preview)
    makepoly(ldraw_lib__6451314e(), step=step, col=col, unit=unit, alt=alt, line=line, solid=solid);
ldraw_lib__6451314e(line=0.2);
